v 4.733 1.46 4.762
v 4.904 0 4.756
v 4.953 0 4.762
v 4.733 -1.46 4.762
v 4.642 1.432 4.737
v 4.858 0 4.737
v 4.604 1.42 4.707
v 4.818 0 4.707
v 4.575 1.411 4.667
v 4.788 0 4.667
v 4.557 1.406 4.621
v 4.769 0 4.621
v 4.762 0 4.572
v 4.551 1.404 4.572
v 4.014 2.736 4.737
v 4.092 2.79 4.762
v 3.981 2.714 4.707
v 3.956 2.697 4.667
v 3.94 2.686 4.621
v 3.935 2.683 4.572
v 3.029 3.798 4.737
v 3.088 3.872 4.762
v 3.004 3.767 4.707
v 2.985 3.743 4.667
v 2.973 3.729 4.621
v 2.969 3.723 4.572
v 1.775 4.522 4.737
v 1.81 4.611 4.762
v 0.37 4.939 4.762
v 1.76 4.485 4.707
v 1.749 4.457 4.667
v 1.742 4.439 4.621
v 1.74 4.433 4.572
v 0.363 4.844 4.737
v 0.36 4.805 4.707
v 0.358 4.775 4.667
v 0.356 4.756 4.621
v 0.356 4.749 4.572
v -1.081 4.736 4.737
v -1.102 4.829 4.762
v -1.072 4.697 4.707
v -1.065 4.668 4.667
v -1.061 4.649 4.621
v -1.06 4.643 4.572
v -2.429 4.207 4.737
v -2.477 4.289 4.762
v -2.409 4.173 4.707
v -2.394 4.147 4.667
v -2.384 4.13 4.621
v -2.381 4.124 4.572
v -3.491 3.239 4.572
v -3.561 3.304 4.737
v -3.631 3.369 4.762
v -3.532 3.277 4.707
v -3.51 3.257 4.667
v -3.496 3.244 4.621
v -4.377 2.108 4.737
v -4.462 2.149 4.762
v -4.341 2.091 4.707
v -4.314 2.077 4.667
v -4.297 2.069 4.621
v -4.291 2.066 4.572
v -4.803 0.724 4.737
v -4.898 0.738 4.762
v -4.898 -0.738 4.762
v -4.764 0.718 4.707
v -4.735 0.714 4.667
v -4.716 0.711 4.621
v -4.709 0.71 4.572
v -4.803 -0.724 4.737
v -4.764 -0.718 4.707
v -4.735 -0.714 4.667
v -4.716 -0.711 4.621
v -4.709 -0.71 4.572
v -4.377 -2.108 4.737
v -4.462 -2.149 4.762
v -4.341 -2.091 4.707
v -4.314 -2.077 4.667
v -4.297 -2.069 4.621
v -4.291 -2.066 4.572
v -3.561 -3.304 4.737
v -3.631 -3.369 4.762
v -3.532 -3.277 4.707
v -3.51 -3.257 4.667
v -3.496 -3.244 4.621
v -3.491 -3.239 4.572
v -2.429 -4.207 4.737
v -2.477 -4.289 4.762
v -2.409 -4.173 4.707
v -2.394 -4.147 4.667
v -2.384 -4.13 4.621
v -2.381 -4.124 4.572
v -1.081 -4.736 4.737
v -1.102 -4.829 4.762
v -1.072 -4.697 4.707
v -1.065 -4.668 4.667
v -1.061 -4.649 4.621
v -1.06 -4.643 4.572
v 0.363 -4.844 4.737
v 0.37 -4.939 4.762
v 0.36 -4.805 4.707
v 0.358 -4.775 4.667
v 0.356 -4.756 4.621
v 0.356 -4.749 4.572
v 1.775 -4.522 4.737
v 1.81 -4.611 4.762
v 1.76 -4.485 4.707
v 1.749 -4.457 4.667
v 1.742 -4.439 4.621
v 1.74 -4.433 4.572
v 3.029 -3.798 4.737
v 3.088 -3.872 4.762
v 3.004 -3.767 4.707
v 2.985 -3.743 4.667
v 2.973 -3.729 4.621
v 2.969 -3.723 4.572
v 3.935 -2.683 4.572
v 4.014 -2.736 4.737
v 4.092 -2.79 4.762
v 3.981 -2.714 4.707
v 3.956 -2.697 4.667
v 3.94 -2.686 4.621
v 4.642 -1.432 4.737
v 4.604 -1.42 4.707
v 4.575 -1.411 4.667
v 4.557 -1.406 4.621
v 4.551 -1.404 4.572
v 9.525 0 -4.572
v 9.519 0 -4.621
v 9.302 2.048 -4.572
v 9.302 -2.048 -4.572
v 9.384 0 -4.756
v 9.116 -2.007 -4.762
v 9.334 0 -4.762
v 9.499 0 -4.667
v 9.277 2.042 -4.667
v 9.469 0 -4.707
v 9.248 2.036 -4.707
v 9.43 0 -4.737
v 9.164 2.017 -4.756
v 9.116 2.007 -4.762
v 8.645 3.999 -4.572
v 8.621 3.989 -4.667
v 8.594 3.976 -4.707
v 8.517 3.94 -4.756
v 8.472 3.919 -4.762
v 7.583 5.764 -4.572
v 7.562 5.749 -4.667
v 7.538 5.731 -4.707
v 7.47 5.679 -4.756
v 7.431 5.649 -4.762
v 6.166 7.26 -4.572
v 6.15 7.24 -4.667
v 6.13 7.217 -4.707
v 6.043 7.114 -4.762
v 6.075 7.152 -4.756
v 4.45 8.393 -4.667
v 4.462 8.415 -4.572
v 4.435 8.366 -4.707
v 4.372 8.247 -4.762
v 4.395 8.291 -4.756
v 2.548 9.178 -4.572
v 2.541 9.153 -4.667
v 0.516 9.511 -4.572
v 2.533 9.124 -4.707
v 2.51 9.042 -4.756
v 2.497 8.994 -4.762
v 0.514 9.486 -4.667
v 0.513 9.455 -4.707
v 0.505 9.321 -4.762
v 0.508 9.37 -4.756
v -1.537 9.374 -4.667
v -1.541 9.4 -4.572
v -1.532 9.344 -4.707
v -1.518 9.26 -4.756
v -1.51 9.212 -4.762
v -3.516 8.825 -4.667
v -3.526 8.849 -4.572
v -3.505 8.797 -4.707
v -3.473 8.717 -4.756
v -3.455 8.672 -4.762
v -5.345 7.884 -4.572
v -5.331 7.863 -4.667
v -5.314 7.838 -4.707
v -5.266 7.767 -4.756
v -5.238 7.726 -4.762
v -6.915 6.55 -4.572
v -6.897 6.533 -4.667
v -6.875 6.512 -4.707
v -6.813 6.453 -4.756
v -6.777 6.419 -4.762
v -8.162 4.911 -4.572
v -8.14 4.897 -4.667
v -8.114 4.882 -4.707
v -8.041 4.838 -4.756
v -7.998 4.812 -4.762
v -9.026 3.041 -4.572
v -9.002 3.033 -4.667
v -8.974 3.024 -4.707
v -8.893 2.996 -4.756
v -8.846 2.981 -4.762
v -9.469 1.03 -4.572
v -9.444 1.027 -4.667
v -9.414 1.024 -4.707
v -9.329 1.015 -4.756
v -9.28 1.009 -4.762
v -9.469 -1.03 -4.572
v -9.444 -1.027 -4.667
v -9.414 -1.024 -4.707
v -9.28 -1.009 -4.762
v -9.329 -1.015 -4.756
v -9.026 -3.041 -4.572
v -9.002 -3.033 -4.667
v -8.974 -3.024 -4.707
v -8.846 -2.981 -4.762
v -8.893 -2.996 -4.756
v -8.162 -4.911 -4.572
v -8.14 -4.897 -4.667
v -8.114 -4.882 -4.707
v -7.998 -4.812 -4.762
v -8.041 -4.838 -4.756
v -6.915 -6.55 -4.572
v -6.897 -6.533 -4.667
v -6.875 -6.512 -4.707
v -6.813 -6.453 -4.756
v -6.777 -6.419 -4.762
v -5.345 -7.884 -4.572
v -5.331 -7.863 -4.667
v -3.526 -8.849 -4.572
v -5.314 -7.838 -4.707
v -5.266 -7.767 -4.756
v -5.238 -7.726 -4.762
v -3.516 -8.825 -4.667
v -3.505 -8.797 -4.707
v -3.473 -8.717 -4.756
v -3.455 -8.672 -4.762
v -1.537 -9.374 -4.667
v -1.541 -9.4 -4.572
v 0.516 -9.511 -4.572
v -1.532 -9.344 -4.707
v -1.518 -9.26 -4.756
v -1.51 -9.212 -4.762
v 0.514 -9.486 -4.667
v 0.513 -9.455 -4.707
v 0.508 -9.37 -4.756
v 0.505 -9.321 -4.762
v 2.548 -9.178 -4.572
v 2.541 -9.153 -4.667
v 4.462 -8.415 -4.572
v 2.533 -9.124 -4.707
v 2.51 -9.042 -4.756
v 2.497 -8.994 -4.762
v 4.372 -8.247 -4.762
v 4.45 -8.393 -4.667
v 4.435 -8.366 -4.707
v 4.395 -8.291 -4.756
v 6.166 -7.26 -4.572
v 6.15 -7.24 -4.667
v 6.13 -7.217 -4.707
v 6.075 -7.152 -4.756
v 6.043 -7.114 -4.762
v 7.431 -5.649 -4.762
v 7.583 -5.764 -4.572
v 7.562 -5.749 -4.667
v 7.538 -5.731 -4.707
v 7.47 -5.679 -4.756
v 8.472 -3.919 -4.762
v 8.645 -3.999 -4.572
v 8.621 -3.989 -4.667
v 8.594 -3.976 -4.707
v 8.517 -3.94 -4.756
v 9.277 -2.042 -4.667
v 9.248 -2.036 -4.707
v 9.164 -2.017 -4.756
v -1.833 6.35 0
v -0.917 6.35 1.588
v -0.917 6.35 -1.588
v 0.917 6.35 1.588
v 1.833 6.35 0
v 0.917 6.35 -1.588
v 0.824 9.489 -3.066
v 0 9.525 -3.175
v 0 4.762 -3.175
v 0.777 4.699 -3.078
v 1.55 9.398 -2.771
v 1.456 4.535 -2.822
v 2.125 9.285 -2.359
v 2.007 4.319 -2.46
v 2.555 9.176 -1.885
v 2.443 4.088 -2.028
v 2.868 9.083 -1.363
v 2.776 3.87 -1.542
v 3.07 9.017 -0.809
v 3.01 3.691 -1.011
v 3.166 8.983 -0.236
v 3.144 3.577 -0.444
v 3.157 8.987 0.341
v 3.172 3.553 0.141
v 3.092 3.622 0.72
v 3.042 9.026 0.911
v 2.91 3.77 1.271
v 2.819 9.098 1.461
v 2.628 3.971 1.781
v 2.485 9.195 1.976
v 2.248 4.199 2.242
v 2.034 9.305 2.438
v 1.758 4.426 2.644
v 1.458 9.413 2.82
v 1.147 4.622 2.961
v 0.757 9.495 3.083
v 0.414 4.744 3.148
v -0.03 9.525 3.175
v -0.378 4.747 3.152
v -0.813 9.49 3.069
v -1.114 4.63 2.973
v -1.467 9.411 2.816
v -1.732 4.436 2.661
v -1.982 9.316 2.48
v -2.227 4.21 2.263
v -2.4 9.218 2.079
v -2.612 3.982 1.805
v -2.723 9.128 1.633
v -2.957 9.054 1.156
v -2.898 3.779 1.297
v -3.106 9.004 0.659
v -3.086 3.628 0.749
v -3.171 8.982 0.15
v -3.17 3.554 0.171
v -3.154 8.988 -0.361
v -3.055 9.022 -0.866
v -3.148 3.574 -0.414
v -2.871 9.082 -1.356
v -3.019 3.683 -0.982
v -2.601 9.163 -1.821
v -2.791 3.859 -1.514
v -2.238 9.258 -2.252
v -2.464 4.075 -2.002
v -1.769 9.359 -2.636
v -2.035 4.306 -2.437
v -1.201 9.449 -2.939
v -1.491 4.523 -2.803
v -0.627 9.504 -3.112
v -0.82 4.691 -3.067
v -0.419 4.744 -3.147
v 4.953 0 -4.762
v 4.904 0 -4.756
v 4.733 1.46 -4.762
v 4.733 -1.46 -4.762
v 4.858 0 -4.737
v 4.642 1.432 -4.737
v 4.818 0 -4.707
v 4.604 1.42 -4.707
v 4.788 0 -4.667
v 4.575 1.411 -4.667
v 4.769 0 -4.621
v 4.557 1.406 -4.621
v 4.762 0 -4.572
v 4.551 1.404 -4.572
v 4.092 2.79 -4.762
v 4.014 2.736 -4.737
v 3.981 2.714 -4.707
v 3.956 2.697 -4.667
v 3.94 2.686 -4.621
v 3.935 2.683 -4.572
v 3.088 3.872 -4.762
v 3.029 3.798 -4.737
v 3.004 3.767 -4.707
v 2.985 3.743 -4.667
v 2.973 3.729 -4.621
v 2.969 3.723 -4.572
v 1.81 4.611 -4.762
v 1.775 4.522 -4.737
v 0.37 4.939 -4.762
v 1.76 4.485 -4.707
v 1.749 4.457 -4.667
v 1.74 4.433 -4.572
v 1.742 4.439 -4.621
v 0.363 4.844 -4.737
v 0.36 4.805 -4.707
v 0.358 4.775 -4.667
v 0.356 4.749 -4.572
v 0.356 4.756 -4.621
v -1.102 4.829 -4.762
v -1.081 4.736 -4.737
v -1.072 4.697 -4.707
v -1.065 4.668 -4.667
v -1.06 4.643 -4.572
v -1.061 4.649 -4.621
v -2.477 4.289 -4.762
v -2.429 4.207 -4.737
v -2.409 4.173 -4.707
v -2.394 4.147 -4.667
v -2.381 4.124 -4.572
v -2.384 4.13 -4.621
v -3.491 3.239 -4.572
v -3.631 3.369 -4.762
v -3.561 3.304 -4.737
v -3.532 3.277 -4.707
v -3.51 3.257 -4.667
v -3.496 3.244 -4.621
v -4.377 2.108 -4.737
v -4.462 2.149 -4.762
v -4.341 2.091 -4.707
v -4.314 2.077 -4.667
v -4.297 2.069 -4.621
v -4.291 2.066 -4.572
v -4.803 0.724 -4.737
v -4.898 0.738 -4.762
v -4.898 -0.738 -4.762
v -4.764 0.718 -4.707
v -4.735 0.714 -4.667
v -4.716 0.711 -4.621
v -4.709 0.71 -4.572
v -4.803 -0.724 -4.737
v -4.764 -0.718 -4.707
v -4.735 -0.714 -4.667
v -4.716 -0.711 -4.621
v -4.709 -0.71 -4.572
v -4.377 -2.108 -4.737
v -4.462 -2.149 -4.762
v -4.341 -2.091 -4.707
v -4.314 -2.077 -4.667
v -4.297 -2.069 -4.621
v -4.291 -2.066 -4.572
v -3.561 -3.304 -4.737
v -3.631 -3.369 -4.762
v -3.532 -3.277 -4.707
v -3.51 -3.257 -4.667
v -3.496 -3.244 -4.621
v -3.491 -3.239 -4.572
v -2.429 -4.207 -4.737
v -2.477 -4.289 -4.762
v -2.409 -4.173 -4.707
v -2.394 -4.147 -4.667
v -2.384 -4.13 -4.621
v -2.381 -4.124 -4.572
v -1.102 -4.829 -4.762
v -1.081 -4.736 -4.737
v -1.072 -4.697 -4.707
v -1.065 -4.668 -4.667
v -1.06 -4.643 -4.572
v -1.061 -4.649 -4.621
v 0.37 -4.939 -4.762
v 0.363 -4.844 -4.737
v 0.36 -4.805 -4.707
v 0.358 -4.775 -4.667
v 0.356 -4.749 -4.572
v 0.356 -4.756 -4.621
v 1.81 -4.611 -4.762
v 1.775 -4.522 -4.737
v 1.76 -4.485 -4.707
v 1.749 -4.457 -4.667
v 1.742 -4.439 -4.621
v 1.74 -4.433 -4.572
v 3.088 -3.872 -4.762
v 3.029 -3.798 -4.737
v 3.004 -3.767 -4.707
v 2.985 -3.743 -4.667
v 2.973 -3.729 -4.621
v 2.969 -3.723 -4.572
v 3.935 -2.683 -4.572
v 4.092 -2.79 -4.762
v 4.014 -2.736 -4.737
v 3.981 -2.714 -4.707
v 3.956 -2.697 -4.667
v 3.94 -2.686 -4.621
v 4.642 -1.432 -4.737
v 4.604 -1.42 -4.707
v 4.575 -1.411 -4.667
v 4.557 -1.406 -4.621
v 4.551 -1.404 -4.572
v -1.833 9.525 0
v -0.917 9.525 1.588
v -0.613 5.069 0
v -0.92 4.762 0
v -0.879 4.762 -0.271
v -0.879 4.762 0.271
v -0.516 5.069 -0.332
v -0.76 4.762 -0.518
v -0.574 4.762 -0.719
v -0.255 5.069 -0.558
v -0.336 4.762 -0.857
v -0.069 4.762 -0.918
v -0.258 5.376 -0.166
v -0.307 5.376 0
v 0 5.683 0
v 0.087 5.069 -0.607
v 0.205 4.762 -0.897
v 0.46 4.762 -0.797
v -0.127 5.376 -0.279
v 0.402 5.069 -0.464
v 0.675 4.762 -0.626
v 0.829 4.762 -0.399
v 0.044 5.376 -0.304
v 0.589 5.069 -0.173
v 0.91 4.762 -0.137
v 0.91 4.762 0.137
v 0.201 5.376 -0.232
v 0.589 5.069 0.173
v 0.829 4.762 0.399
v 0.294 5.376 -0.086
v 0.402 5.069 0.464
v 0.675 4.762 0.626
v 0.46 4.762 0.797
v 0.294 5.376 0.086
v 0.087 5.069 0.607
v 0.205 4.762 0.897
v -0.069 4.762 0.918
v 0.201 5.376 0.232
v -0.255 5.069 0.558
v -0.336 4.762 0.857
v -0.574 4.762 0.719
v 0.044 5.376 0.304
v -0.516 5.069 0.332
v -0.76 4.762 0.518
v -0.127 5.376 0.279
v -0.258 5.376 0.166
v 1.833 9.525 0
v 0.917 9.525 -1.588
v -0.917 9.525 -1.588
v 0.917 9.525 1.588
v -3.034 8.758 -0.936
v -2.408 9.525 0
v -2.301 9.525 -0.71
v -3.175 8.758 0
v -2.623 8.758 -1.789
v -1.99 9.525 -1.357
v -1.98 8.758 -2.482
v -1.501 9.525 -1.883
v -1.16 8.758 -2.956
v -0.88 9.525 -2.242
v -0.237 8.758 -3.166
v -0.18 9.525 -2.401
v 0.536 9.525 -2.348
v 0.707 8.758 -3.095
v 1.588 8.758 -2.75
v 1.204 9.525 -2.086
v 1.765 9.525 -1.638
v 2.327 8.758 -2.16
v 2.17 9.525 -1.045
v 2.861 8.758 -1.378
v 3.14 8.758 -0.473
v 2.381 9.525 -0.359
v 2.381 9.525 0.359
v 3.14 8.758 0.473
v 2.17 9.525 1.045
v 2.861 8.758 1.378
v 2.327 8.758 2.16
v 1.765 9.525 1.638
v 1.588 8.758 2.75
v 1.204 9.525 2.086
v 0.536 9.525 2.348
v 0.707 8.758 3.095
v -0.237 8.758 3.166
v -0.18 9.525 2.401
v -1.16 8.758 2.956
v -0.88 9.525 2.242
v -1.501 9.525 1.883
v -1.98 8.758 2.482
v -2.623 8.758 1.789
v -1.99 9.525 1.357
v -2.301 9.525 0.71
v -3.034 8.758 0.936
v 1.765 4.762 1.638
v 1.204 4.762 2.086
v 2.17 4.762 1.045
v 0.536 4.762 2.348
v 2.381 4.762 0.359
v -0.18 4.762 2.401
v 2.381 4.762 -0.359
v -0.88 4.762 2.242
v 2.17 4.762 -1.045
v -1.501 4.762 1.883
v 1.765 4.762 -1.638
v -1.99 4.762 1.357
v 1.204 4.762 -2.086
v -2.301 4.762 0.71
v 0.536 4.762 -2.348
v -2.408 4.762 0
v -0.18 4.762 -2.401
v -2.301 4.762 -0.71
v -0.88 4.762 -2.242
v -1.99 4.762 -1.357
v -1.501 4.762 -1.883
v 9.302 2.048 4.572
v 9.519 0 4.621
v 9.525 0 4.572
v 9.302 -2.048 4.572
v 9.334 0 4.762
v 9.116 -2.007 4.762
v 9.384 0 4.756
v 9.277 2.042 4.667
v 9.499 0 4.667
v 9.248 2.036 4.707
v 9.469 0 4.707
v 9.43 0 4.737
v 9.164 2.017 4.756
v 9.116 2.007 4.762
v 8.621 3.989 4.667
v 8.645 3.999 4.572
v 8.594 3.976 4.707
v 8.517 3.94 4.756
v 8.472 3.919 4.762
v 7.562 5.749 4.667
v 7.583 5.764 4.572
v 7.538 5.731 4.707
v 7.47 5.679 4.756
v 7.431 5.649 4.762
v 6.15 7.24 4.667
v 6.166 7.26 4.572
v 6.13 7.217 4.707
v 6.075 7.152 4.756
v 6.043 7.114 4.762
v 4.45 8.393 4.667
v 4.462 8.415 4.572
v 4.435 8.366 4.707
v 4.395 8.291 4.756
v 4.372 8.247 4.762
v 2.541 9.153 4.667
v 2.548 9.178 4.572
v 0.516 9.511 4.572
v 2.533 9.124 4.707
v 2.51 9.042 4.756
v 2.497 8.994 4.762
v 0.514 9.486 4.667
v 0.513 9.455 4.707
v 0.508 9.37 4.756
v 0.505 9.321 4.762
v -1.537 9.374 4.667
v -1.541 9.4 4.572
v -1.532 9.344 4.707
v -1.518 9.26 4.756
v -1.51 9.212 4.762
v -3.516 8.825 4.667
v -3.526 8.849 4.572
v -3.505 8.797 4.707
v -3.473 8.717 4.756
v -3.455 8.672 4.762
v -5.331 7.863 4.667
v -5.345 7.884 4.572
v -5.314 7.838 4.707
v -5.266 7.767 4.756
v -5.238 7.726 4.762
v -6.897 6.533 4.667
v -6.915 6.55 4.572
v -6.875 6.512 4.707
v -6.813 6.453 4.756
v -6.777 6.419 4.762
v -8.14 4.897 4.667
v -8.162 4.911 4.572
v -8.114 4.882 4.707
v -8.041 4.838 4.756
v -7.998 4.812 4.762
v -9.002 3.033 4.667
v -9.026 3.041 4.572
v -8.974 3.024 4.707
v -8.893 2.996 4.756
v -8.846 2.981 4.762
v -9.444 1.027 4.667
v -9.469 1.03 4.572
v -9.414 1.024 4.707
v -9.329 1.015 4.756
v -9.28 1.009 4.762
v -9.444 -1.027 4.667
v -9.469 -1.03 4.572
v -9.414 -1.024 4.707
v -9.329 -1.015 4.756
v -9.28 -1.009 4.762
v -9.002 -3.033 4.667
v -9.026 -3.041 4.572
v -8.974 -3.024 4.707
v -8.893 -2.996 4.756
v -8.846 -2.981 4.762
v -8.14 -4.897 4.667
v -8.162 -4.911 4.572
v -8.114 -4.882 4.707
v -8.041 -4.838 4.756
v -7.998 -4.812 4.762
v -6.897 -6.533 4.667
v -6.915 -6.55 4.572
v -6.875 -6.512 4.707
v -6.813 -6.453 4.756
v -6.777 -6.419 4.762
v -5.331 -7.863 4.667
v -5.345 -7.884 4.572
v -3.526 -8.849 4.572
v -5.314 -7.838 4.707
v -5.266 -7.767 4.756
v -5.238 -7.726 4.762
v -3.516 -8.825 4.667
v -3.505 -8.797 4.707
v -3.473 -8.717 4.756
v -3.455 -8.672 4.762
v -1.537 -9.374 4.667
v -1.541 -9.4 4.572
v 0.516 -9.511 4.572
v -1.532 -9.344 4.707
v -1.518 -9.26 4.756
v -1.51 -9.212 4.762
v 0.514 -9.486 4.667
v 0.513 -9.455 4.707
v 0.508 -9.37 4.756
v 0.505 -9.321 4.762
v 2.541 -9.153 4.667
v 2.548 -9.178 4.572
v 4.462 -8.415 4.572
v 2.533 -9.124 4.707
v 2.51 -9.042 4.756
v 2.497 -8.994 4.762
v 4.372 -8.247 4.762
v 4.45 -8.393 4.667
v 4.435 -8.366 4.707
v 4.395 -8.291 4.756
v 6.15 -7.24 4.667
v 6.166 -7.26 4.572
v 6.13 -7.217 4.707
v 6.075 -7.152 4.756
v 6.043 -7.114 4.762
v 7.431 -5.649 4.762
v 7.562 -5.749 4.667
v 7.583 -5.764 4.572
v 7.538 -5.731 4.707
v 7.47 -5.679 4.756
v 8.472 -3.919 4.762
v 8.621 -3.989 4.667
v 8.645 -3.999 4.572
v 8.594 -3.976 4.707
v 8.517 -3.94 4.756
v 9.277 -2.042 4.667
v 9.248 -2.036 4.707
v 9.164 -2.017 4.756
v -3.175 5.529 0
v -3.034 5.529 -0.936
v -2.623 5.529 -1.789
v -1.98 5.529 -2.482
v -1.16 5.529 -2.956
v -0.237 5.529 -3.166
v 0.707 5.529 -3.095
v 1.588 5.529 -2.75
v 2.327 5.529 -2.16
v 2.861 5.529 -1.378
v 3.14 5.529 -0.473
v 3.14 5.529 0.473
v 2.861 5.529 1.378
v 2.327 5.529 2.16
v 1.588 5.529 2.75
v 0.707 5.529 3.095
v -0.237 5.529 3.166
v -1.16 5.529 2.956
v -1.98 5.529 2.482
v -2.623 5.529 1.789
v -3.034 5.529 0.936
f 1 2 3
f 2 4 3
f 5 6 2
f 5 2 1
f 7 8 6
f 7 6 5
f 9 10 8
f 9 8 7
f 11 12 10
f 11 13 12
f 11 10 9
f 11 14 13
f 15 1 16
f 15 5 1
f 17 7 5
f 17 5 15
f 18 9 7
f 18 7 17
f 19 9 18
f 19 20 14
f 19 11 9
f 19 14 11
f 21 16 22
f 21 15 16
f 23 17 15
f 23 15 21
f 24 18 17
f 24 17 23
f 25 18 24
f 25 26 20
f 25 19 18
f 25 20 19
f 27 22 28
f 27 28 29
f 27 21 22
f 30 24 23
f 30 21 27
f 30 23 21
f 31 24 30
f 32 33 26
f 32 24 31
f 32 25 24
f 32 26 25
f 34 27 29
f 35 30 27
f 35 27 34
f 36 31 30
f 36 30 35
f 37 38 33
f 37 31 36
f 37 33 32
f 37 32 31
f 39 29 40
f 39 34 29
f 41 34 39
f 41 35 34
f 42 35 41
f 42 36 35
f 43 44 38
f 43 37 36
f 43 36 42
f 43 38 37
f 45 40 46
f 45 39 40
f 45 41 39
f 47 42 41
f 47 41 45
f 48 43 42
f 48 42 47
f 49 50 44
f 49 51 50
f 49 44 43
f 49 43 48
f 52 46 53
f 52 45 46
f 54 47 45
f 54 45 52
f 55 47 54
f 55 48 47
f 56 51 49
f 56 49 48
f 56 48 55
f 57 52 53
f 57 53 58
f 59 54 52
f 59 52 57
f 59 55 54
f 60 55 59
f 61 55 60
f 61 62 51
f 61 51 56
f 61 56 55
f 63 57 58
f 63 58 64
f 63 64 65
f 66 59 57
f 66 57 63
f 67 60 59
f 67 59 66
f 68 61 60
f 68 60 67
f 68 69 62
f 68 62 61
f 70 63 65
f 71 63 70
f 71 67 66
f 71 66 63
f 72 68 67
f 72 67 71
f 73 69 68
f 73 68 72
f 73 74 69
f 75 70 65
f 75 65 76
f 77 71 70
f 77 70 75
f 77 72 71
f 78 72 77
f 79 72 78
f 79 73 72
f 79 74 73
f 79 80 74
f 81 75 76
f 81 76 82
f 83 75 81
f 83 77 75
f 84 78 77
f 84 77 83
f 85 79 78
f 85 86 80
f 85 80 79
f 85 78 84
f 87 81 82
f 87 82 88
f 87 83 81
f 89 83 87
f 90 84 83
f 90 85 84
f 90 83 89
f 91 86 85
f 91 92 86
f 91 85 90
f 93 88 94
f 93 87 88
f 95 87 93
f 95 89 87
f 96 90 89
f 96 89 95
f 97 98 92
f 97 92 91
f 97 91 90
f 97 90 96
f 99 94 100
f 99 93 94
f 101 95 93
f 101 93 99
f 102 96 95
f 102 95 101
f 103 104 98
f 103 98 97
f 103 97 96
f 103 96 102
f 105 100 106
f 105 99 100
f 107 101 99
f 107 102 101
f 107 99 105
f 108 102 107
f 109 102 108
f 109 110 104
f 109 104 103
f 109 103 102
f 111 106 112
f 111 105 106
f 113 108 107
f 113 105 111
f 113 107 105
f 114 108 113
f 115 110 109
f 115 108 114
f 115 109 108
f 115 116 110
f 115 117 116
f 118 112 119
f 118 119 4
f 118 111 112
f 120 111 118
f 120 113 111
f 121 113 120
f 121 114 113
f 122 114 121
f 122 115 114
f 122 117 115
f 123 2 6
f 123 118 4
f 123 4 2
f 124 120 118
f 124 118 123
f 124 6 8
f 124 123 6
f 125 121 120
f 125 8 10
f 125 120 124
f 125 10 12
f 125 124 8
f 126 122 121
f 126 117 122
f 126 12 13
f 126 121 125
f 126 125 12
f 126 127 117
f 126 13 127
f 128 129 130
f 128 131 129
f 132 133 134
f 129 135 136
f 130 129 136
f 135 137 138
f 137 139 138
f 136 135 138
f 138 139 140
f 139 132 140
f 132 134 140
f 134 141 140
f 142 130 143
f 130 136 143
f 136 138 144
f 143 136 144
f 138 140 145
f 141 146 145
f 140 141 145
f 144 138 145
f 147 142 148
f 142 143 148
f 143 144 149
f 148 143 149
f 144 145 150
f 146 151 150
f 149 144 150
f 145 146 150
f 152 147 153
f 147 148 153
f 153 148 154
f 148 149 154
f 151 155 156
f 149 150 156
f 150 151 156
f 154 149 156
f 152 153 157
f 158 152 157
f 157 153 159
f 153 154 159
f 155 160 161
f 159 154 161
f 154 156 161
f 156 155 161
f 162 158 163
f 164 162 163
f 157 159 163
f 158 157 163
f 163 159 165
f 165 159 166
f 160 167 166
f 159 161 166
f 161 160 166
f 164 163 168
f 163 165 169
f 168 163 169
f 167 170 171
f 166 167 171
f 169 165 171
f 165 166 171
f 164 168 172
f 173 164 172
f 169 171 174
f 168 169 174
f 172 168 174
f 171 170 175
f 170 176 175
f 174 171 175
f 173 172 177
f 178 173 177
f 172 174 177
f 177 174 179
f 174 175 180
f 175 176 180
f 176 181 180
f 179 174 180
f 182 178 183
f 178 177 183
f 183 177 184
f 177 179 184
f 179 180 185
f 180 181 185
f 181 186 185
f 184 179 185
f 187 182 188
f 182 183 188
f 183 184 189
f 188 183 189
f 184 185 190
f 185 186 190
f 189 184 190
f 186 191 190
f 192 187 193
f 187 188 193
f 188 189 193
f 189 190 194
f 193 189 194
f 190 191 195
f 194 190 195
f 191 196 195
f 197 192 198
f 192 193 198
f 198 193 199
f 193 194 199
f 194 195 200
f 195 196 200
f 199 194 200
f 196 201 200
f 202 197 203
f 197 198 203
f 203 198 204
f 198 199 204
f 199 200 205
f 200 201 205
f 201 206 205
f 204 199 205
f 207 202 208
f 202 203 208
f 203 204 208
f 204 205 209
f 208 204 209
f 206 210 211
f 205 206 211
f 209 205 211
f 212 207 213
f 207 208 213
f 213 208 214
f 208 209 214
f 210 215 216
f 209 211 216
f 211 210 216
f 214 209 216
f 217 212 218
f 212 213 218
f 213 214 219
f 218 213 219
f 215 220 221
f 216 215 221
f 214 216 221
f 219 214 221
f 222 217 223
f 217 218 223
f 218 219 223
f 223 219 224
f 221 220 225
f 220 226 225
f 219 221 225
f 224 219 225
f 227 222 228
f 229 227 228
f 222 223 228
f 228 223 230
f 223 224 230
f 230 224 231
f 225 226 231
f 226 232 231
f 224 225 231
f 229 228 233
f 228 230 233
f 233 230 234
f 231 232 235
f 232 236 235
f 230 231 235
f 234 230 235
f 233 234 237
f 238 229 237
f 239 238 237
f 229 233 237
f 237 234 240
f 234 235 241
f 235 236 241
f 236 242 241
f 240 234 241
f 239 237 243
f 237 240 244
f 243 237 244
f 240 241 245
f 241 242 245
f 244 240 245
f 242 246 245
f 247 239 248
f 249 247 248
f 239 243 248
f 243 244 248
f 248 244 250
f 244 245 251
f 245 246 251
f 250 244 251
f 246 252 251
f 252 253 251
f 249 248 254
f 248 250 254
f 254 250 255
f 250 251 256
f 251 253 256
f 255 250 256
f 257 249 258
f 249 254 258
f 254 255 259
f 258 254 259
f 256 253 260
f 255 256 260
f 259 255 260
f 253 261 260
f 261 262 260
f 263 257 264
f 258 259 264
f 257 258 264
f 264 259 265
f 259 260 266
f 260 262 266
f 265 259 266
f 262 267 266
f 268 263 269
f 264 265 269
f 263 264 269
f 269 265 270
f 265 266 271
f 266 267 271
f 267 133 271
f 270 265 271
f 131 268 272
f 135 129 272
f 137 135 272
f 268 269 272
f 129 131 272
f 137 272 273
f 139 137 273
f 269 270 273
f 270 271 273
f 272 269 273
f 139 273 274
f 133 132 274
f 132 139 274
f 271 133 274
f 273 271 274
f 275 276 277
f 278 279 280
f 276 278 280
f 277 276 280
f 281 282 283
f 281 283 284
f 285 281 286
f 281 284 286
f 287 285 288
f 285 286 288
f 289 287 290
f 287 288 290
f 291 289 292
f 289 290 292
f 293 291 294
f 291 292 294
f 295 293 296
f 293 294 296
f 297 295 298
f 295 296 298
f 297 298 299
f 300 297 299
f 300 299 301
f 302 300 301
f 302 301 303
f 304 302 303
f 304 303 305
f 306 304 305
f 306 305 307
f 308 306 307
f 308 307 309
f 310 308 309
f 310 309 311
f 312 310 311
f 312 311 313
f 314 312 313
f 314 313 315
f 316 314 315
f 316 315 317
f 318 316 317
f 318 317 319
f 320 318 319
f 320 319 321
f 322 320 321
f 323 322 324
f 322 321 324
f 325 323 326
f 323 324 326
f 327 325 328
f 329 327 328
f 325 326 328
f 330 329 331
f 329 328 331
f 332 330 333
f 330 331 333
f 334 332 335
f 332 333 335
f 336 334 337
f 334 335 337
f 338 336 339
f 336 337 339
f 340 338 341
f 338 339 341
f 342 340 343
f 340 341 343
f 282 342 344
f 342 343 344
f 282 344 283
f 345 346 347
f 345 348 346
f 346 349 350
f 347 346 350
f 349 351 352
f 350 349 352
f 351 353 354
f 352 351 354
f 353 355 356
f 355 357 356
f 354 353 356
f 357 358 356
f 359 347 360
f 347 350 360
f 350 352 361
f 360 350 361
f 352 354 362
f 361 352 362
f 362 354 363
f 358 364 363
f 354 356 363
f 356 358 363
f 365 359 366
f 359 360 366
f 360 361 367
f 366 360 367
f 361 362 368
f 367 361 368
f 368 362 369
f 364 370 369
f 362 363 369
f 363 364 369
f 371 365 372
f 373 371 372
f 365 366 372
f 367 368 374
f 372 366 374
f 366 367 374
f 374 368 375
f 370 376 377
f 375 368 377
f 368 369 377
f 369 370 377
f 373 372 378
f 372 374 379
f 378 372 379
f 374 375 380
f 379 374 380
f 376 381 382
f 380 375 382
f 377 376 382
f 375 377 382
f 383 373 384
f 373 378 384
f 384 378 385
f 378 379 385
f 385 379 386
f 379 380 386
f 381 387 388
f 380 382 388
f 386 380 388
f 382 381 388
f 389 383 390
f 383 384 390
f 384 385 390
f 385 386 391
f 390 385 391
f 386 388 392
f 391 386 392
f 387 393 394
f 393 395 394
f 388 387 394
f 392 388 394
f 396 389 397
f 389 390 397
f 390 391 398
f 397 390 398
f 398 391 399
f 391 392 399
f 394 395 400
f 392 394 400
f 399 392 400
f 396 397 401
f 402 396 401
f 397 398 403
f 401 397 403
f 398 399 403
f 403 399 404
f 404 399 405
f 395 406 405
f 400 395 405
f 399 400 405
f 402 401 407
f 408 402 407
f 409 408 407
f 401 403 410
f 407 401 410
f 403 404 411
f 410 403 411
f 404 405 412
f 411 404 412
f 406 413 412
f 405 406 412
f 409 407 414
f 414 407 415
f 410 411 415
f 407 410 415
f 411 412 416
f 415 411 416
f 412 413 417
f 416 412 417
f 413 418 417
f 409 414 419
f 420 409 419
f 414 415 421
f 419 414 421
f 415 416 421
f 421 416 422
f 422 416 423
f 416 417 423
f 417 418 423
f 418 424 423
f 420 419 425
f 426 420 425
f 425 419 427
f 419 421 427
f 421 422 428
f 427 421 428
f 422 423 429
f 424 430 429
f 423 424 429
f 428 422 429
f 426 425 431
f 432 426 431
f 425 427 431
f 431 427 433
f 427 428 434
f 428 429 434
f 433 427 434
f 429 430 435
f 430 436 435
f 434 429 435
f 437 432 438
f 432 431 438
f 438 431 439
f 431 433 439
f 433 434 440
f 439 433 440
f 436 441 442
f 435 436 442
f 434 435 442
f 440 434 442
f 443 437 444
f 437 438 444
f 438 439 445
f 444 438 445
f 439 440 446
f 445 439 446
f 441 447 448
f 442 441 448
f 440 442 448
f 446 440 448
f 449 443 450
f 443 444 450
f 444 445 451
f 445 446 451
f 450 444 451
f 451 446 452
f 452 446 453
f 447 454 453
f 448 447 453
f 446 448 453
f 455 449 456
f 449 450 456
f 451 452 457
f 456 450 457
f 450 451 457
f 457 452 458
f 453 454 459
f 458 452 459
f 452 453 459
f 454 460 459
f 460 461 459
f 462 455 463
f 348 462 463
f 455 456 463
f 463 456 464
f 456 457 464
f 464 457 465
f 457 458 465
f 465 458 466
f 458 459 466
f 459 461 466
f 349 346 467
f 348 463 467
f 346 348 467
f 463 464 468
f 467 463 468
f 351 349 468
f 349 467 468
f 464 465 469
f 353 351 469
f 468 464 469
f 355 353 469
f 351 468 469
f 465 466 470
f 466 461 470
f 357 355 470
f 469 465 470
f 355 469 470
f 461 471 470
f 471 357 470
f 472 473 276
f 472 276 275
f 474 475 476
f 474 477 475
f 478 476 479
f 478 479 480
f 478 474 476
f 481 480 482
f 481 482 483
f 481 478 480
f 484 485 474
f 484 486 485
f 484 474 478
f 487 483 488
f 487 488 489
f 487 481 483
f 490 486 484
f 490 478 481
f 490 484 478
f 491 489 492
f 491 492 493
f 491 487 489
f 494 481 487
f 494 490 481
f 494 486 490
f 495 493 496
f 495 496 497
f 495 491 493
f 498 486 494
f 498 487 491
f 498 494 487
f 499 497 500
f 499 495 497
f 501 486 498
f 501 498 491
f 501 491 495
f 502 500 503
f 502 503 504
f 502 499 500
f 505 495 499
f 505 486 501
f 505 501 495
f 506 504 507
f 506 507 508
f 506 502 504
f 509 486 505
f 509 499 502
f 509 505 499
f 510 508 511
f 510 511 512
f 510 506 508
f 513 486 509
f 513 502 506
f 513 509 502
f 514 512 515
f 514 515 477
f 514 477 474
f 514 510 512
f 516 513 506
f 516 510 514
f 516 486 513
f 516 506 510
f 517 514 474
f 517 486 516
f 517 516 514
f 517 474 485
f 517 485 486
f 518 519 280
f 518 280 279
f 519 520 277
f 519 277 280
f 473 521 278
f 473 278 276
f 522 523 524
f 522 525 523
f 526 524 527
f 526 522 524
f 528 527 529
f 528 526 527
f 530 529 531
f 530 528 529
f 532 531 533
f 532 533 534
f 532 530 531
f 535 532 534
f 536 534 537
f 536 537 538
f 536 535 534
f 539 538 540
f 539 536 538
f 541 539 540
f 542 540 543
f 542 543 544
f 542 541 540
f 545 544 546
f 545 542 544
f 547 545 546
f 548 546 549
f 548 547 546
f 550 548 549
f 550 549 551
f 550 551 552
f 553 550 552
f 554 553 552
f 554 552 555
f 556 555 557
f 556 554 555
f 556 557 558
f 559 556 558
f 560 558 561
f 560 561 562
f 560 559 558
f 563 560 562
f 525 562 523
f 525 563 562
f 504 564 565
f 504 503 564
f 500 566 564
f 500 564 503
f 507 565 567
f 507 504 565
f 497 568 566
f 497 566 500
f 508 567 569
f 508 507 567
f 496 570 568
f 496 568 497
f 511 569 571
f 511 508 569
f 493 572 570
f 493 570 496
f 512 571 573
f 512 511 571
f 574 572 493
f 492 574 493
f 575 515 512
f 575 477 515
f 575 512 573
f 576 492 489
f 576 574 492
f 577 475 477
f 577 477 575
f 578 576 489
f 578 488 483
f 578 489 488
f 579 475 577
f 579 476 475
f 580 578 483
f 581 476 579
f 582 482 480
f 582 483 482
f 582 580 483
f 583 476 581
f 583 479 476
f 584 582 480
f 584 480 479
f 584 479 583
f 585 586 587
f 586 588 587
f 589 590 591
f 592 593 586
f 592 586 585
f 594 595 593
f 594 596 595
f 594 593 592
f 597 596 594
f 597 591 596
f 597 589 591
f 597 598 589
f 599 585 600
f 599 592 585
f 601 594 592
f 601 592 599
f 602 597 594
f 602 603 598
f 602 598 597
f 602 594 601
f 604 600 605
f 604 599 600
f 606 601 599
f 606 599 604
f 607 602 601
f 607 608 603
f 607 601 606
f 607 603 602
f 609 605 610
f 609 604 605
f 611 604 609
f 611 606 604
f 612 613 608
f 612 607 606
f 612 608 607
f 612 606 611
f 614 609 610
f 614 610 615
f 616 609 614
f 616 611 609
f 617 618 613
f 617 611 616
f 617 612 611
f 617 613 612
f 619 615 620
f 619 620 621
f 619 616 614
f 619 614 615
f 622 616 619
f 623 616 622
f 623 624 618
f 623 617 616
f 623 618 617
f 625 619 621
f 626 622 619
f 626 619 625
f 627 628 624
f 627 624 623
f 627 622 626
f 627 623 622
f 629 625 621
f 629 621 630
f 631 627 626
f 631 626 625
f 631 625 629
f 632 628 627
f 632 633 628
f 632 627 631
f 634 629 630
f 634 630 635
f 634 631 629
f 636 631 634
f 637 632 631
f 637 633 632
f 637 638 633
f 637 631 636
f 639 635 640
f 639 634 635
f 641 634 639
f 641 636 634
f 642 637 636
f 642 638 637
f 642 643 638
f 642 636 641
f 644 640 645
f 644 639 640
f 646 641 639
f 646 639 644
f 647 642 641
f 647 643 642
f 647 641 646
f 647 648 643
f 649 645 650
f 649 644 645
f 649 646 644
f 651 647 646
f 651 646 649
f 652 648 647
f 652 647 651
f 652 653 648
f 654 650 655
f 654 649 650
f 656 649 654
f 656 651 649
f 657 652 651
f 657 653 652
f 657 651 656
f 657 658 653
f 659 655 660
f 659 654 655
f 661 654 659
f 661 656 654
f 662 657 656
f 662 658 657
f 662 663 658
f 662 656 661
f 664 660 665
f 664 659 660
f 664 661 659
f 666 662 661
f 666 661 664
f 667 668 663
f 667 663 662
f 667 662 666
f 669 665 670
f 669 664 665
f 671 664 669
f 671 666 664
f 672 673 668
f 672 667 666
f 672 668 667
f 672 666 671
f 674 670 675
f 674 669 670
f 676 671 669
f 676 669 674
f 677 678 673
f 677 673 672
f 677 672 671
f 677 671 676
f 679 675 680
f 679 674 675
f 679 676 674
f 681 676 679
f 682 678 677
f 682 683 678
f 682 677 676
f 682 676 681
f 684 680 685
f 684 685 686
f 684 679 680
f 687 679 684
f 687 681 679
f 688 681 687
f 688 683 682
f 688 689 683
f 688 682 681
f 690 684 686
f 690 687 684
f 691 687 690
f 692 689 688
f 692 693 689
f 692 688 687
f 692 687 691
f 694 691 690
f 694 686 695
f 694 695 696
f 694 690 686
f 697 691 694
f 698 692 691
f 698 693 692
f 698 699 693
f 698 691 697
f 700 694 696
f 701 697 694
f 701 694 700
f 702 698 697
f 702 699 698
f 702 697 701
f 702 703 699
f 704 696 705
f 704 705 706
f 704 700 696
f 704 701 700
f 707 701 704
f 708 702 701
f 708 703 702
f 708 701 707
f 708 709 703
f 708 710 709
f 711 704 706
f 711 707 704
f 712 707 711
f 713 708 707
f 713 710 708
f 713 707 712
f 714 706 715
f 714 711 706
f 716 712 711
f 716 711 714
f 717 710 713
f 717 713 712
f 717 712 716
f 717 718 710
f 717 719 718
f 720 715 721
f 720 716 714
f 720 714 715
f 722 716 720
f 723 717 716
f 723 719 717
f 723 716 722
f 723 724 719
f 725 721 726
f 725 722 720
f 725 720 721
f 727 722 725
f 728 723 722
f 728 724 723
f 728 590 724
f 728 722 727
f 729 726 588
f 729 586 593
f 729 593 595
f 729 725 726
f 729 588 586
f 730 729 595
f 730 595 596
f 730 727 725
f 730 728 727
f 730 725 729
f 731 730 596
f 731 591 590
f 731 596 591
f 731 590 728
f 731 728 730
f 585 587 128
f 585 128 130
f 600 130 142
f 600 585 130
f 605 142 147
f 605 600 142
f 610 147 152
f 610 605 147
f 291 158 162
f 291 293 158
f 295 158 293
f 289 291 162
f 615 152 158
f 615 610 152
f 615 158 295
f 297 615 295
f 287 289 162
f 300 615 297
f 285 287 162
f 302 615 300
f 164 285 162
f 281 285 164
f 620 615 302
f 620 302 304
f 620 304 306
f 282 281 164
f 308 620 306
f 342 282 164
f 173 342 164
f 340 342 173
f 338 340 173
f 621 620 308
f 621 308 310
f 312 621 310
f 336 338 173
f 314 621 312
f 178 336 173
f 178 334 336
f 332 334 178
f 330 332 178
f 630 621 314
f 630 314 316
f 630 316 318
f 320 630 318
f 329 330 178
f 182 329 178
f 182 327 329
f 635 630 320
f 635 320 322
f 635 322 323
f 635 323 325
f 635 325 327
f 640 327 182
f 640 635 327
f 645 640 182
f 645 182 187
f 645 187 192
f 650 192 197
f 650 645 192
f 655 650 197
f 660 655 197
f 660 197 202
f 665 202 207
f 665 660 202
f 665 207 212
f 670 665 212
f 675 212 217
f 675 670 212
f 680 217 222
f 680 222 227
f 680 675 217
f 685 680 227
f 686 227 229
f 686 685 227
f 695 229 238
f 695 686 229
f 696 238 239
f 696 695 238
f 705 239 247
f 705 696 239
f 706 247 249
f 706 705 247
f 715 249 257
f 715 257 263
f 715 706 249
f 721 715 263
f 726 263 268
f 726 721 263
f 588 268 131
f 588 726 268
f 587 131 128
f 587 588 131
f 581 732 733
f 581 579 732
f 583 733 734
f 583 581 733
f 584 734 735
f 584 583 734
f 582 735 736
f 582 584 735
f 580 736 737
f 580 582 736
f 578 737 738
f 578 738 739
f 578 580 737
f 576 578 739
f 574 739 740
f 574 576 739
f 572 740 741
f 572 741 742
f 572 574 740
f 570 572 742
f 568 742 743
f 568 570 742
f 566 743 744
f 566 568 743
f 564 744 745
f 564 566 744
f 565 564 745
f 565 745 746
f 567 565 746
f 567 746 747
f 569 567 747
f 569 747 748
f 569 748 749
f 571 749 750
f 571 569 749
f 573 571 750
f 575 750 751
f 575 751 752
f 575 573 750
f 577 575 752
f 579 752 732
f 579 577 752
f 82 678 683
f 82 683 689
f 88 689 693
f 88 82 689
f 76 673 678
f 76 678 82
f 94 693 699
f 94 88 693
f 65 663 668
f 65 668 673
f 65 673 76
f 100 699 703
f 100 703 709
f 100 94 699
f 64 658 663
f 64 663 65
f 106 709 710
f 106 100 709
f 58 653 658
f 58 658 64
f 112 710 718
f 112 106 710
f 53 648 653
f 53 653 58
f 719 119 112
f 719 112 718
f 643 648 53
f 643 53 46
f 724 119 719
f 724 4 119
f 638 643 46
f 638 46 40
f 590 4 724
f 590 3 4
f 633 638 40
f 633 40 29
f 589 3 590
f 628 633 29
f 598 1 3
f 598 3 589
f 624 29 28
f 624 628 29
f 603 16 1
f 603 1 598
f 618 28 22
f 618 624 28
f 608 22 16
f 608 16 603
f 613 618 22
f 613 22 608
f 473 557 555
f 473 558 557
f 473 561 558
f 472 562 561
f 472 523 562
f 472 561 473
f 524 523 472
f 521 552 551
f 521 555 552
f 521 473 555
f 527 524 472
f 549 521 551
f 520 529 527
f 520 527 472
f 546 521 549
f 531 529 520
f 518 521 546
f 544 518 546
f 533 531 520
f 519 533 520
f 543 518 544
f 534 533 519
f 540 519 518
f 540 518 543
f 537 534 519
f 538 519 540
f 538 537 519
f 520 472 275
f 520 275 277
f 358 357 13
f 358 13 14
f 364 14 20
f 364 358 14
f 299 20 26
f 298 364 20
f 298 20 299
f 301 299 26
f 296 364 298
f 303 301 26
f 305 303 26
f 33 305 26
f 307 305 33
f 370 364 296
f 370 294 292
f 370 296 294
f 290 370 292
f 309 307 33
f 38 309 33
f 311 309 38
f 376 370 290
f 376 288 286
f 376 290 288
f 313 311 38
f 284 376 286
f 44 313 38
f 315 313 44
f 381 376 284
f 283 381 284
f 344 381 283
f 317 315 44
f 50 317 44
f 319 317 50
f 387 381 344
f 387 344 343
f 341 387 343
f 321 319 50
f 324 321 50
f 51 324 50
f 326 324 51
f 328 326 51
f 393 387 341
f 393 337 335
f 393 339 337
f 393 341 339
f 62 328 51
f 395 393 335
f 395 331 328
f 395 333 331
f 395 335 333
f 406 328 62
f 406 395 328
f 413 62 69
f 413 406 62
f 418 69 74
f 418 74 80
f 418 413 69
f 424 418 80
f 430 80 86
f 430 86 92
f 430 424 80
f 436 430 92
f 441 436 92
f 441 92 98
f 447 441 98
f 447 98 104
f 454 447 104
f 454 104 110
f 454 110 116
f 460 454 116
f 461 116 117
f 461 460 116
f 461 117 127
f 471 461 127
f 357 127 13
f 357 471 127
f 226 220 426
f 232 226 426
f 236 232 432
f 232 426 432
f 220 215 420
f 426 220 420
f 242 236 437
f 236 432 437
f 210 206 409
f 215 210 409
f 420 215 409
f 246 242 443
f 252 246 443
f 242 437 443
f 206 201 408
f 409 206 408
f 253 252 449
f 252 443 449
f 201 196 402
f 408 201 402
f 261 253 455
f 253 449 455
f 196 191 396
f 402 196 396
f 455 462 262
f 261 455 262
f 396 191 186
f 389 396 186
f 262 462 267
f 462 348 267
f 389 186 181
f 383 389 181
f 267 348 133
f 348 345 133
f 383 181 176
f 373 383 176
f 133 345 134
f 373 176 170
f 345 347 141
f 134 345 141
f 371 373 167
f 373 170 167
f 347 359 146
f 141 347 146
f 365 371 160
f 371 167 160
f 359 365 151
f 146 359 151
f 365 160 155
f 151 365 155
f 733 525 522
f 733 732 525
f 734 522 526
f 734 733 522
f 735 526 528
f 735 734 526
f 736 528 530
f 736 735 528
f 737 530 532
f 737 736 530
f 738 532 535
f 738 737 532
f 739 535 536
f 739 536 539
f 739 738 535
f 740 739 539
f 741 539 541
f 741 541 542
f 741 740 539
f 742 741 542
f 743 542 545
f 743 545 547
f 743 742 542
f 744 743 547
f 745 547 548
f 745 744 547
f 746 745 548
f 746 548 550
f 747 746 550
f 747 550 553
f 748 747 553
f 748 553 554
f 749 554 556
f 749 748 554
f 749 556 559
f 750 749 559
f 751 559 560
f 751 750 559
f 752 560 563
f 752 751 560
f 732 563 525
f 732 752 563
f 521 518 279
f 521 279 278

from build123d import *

# Parameters (mm, degrees)
SKETCH1_R          = 9.525
SKETCH1_R_2        = 4.7625
EXTRUDE1_DEPTH     = 4.7625
SKETCH2_R          = 3.175
CUT_EXTRUDE1_DEPTH = 10.525
FILLET1_R          = 0.1905
CUT_EXTRUDE2_DEPTH = 3.175


with BuildPart() as part:
    # Sketch1 → Extrude1 (new body, symmetric)
    with BuildSketch(Plane.XY):
        Circle(SKETCH1_R)
        Circle(SKETCH1_R_2, mode=Mode.SUBTRACT)
    extrude(amount=EXTRUDE1_DEPTH, both=True)

    # Sketch2 → Cut-Extrude1 (cut, through all)
    with BuildSketch(Plane(origin=(41.275, 0, 0), x_dir=(0, 0, -1), z_dir=(0, -1, 0))):
        with Locations((0, -41.275)):
            Circle(SKETCH2_R)
    extrude(amount=-CUT_EXTRUDE1_DEPTH, mode=Mode.SUBTRACT)

    # Fillet1
    fillet1_edges = [part.edges().sort_by_distance(p)[0] for p in [
        (-9.525, 0, -4.7625),
        (-9.525, 0, 4.7625),
        (-4.7625, 0, -4.7625),
        (-4.7625, 0, 4.7625),
    ]]
    fillet(fillet1_edges, radius=FILLET1_R)


with BuildPart() as body_2:
    # Sketch3 → Revolve1 (revolve)
    with BuildSketch(Plane.XY):
        Polygon((-2.408192631, 4.7625), (-0.920168843, 4.7625), (0, 5.682668843), (0, 9.525), (-2.408192631, 9.525), (-3.175, 8.758192631), (-3.175, 5.529307369), align=None)
    revolve(axis=Axis((0, 4.7625, 0), (0, -1, 0)))

    # Sketch4 → Cut-Extrude2 (cut)
    with BuildSketch(Plane(origin=(3.3734375, 9.525, 0), x_dir=(0, 0, -1), z_dir=(0, -1, 0))):
        Polygon((0, -1.540350395), (-1.5875, -2.456893948), (-1.5875, -4.289981052), (0, -5.206524605), (1.5875, -4.289981052), (1.5875, -2.456893948), align=None)
    extrude(amount=CUT_EXTRUDE2_DEPTH, mode=Mode.SUBTRACT)


solid = Compound([part.part, body_2.part])
